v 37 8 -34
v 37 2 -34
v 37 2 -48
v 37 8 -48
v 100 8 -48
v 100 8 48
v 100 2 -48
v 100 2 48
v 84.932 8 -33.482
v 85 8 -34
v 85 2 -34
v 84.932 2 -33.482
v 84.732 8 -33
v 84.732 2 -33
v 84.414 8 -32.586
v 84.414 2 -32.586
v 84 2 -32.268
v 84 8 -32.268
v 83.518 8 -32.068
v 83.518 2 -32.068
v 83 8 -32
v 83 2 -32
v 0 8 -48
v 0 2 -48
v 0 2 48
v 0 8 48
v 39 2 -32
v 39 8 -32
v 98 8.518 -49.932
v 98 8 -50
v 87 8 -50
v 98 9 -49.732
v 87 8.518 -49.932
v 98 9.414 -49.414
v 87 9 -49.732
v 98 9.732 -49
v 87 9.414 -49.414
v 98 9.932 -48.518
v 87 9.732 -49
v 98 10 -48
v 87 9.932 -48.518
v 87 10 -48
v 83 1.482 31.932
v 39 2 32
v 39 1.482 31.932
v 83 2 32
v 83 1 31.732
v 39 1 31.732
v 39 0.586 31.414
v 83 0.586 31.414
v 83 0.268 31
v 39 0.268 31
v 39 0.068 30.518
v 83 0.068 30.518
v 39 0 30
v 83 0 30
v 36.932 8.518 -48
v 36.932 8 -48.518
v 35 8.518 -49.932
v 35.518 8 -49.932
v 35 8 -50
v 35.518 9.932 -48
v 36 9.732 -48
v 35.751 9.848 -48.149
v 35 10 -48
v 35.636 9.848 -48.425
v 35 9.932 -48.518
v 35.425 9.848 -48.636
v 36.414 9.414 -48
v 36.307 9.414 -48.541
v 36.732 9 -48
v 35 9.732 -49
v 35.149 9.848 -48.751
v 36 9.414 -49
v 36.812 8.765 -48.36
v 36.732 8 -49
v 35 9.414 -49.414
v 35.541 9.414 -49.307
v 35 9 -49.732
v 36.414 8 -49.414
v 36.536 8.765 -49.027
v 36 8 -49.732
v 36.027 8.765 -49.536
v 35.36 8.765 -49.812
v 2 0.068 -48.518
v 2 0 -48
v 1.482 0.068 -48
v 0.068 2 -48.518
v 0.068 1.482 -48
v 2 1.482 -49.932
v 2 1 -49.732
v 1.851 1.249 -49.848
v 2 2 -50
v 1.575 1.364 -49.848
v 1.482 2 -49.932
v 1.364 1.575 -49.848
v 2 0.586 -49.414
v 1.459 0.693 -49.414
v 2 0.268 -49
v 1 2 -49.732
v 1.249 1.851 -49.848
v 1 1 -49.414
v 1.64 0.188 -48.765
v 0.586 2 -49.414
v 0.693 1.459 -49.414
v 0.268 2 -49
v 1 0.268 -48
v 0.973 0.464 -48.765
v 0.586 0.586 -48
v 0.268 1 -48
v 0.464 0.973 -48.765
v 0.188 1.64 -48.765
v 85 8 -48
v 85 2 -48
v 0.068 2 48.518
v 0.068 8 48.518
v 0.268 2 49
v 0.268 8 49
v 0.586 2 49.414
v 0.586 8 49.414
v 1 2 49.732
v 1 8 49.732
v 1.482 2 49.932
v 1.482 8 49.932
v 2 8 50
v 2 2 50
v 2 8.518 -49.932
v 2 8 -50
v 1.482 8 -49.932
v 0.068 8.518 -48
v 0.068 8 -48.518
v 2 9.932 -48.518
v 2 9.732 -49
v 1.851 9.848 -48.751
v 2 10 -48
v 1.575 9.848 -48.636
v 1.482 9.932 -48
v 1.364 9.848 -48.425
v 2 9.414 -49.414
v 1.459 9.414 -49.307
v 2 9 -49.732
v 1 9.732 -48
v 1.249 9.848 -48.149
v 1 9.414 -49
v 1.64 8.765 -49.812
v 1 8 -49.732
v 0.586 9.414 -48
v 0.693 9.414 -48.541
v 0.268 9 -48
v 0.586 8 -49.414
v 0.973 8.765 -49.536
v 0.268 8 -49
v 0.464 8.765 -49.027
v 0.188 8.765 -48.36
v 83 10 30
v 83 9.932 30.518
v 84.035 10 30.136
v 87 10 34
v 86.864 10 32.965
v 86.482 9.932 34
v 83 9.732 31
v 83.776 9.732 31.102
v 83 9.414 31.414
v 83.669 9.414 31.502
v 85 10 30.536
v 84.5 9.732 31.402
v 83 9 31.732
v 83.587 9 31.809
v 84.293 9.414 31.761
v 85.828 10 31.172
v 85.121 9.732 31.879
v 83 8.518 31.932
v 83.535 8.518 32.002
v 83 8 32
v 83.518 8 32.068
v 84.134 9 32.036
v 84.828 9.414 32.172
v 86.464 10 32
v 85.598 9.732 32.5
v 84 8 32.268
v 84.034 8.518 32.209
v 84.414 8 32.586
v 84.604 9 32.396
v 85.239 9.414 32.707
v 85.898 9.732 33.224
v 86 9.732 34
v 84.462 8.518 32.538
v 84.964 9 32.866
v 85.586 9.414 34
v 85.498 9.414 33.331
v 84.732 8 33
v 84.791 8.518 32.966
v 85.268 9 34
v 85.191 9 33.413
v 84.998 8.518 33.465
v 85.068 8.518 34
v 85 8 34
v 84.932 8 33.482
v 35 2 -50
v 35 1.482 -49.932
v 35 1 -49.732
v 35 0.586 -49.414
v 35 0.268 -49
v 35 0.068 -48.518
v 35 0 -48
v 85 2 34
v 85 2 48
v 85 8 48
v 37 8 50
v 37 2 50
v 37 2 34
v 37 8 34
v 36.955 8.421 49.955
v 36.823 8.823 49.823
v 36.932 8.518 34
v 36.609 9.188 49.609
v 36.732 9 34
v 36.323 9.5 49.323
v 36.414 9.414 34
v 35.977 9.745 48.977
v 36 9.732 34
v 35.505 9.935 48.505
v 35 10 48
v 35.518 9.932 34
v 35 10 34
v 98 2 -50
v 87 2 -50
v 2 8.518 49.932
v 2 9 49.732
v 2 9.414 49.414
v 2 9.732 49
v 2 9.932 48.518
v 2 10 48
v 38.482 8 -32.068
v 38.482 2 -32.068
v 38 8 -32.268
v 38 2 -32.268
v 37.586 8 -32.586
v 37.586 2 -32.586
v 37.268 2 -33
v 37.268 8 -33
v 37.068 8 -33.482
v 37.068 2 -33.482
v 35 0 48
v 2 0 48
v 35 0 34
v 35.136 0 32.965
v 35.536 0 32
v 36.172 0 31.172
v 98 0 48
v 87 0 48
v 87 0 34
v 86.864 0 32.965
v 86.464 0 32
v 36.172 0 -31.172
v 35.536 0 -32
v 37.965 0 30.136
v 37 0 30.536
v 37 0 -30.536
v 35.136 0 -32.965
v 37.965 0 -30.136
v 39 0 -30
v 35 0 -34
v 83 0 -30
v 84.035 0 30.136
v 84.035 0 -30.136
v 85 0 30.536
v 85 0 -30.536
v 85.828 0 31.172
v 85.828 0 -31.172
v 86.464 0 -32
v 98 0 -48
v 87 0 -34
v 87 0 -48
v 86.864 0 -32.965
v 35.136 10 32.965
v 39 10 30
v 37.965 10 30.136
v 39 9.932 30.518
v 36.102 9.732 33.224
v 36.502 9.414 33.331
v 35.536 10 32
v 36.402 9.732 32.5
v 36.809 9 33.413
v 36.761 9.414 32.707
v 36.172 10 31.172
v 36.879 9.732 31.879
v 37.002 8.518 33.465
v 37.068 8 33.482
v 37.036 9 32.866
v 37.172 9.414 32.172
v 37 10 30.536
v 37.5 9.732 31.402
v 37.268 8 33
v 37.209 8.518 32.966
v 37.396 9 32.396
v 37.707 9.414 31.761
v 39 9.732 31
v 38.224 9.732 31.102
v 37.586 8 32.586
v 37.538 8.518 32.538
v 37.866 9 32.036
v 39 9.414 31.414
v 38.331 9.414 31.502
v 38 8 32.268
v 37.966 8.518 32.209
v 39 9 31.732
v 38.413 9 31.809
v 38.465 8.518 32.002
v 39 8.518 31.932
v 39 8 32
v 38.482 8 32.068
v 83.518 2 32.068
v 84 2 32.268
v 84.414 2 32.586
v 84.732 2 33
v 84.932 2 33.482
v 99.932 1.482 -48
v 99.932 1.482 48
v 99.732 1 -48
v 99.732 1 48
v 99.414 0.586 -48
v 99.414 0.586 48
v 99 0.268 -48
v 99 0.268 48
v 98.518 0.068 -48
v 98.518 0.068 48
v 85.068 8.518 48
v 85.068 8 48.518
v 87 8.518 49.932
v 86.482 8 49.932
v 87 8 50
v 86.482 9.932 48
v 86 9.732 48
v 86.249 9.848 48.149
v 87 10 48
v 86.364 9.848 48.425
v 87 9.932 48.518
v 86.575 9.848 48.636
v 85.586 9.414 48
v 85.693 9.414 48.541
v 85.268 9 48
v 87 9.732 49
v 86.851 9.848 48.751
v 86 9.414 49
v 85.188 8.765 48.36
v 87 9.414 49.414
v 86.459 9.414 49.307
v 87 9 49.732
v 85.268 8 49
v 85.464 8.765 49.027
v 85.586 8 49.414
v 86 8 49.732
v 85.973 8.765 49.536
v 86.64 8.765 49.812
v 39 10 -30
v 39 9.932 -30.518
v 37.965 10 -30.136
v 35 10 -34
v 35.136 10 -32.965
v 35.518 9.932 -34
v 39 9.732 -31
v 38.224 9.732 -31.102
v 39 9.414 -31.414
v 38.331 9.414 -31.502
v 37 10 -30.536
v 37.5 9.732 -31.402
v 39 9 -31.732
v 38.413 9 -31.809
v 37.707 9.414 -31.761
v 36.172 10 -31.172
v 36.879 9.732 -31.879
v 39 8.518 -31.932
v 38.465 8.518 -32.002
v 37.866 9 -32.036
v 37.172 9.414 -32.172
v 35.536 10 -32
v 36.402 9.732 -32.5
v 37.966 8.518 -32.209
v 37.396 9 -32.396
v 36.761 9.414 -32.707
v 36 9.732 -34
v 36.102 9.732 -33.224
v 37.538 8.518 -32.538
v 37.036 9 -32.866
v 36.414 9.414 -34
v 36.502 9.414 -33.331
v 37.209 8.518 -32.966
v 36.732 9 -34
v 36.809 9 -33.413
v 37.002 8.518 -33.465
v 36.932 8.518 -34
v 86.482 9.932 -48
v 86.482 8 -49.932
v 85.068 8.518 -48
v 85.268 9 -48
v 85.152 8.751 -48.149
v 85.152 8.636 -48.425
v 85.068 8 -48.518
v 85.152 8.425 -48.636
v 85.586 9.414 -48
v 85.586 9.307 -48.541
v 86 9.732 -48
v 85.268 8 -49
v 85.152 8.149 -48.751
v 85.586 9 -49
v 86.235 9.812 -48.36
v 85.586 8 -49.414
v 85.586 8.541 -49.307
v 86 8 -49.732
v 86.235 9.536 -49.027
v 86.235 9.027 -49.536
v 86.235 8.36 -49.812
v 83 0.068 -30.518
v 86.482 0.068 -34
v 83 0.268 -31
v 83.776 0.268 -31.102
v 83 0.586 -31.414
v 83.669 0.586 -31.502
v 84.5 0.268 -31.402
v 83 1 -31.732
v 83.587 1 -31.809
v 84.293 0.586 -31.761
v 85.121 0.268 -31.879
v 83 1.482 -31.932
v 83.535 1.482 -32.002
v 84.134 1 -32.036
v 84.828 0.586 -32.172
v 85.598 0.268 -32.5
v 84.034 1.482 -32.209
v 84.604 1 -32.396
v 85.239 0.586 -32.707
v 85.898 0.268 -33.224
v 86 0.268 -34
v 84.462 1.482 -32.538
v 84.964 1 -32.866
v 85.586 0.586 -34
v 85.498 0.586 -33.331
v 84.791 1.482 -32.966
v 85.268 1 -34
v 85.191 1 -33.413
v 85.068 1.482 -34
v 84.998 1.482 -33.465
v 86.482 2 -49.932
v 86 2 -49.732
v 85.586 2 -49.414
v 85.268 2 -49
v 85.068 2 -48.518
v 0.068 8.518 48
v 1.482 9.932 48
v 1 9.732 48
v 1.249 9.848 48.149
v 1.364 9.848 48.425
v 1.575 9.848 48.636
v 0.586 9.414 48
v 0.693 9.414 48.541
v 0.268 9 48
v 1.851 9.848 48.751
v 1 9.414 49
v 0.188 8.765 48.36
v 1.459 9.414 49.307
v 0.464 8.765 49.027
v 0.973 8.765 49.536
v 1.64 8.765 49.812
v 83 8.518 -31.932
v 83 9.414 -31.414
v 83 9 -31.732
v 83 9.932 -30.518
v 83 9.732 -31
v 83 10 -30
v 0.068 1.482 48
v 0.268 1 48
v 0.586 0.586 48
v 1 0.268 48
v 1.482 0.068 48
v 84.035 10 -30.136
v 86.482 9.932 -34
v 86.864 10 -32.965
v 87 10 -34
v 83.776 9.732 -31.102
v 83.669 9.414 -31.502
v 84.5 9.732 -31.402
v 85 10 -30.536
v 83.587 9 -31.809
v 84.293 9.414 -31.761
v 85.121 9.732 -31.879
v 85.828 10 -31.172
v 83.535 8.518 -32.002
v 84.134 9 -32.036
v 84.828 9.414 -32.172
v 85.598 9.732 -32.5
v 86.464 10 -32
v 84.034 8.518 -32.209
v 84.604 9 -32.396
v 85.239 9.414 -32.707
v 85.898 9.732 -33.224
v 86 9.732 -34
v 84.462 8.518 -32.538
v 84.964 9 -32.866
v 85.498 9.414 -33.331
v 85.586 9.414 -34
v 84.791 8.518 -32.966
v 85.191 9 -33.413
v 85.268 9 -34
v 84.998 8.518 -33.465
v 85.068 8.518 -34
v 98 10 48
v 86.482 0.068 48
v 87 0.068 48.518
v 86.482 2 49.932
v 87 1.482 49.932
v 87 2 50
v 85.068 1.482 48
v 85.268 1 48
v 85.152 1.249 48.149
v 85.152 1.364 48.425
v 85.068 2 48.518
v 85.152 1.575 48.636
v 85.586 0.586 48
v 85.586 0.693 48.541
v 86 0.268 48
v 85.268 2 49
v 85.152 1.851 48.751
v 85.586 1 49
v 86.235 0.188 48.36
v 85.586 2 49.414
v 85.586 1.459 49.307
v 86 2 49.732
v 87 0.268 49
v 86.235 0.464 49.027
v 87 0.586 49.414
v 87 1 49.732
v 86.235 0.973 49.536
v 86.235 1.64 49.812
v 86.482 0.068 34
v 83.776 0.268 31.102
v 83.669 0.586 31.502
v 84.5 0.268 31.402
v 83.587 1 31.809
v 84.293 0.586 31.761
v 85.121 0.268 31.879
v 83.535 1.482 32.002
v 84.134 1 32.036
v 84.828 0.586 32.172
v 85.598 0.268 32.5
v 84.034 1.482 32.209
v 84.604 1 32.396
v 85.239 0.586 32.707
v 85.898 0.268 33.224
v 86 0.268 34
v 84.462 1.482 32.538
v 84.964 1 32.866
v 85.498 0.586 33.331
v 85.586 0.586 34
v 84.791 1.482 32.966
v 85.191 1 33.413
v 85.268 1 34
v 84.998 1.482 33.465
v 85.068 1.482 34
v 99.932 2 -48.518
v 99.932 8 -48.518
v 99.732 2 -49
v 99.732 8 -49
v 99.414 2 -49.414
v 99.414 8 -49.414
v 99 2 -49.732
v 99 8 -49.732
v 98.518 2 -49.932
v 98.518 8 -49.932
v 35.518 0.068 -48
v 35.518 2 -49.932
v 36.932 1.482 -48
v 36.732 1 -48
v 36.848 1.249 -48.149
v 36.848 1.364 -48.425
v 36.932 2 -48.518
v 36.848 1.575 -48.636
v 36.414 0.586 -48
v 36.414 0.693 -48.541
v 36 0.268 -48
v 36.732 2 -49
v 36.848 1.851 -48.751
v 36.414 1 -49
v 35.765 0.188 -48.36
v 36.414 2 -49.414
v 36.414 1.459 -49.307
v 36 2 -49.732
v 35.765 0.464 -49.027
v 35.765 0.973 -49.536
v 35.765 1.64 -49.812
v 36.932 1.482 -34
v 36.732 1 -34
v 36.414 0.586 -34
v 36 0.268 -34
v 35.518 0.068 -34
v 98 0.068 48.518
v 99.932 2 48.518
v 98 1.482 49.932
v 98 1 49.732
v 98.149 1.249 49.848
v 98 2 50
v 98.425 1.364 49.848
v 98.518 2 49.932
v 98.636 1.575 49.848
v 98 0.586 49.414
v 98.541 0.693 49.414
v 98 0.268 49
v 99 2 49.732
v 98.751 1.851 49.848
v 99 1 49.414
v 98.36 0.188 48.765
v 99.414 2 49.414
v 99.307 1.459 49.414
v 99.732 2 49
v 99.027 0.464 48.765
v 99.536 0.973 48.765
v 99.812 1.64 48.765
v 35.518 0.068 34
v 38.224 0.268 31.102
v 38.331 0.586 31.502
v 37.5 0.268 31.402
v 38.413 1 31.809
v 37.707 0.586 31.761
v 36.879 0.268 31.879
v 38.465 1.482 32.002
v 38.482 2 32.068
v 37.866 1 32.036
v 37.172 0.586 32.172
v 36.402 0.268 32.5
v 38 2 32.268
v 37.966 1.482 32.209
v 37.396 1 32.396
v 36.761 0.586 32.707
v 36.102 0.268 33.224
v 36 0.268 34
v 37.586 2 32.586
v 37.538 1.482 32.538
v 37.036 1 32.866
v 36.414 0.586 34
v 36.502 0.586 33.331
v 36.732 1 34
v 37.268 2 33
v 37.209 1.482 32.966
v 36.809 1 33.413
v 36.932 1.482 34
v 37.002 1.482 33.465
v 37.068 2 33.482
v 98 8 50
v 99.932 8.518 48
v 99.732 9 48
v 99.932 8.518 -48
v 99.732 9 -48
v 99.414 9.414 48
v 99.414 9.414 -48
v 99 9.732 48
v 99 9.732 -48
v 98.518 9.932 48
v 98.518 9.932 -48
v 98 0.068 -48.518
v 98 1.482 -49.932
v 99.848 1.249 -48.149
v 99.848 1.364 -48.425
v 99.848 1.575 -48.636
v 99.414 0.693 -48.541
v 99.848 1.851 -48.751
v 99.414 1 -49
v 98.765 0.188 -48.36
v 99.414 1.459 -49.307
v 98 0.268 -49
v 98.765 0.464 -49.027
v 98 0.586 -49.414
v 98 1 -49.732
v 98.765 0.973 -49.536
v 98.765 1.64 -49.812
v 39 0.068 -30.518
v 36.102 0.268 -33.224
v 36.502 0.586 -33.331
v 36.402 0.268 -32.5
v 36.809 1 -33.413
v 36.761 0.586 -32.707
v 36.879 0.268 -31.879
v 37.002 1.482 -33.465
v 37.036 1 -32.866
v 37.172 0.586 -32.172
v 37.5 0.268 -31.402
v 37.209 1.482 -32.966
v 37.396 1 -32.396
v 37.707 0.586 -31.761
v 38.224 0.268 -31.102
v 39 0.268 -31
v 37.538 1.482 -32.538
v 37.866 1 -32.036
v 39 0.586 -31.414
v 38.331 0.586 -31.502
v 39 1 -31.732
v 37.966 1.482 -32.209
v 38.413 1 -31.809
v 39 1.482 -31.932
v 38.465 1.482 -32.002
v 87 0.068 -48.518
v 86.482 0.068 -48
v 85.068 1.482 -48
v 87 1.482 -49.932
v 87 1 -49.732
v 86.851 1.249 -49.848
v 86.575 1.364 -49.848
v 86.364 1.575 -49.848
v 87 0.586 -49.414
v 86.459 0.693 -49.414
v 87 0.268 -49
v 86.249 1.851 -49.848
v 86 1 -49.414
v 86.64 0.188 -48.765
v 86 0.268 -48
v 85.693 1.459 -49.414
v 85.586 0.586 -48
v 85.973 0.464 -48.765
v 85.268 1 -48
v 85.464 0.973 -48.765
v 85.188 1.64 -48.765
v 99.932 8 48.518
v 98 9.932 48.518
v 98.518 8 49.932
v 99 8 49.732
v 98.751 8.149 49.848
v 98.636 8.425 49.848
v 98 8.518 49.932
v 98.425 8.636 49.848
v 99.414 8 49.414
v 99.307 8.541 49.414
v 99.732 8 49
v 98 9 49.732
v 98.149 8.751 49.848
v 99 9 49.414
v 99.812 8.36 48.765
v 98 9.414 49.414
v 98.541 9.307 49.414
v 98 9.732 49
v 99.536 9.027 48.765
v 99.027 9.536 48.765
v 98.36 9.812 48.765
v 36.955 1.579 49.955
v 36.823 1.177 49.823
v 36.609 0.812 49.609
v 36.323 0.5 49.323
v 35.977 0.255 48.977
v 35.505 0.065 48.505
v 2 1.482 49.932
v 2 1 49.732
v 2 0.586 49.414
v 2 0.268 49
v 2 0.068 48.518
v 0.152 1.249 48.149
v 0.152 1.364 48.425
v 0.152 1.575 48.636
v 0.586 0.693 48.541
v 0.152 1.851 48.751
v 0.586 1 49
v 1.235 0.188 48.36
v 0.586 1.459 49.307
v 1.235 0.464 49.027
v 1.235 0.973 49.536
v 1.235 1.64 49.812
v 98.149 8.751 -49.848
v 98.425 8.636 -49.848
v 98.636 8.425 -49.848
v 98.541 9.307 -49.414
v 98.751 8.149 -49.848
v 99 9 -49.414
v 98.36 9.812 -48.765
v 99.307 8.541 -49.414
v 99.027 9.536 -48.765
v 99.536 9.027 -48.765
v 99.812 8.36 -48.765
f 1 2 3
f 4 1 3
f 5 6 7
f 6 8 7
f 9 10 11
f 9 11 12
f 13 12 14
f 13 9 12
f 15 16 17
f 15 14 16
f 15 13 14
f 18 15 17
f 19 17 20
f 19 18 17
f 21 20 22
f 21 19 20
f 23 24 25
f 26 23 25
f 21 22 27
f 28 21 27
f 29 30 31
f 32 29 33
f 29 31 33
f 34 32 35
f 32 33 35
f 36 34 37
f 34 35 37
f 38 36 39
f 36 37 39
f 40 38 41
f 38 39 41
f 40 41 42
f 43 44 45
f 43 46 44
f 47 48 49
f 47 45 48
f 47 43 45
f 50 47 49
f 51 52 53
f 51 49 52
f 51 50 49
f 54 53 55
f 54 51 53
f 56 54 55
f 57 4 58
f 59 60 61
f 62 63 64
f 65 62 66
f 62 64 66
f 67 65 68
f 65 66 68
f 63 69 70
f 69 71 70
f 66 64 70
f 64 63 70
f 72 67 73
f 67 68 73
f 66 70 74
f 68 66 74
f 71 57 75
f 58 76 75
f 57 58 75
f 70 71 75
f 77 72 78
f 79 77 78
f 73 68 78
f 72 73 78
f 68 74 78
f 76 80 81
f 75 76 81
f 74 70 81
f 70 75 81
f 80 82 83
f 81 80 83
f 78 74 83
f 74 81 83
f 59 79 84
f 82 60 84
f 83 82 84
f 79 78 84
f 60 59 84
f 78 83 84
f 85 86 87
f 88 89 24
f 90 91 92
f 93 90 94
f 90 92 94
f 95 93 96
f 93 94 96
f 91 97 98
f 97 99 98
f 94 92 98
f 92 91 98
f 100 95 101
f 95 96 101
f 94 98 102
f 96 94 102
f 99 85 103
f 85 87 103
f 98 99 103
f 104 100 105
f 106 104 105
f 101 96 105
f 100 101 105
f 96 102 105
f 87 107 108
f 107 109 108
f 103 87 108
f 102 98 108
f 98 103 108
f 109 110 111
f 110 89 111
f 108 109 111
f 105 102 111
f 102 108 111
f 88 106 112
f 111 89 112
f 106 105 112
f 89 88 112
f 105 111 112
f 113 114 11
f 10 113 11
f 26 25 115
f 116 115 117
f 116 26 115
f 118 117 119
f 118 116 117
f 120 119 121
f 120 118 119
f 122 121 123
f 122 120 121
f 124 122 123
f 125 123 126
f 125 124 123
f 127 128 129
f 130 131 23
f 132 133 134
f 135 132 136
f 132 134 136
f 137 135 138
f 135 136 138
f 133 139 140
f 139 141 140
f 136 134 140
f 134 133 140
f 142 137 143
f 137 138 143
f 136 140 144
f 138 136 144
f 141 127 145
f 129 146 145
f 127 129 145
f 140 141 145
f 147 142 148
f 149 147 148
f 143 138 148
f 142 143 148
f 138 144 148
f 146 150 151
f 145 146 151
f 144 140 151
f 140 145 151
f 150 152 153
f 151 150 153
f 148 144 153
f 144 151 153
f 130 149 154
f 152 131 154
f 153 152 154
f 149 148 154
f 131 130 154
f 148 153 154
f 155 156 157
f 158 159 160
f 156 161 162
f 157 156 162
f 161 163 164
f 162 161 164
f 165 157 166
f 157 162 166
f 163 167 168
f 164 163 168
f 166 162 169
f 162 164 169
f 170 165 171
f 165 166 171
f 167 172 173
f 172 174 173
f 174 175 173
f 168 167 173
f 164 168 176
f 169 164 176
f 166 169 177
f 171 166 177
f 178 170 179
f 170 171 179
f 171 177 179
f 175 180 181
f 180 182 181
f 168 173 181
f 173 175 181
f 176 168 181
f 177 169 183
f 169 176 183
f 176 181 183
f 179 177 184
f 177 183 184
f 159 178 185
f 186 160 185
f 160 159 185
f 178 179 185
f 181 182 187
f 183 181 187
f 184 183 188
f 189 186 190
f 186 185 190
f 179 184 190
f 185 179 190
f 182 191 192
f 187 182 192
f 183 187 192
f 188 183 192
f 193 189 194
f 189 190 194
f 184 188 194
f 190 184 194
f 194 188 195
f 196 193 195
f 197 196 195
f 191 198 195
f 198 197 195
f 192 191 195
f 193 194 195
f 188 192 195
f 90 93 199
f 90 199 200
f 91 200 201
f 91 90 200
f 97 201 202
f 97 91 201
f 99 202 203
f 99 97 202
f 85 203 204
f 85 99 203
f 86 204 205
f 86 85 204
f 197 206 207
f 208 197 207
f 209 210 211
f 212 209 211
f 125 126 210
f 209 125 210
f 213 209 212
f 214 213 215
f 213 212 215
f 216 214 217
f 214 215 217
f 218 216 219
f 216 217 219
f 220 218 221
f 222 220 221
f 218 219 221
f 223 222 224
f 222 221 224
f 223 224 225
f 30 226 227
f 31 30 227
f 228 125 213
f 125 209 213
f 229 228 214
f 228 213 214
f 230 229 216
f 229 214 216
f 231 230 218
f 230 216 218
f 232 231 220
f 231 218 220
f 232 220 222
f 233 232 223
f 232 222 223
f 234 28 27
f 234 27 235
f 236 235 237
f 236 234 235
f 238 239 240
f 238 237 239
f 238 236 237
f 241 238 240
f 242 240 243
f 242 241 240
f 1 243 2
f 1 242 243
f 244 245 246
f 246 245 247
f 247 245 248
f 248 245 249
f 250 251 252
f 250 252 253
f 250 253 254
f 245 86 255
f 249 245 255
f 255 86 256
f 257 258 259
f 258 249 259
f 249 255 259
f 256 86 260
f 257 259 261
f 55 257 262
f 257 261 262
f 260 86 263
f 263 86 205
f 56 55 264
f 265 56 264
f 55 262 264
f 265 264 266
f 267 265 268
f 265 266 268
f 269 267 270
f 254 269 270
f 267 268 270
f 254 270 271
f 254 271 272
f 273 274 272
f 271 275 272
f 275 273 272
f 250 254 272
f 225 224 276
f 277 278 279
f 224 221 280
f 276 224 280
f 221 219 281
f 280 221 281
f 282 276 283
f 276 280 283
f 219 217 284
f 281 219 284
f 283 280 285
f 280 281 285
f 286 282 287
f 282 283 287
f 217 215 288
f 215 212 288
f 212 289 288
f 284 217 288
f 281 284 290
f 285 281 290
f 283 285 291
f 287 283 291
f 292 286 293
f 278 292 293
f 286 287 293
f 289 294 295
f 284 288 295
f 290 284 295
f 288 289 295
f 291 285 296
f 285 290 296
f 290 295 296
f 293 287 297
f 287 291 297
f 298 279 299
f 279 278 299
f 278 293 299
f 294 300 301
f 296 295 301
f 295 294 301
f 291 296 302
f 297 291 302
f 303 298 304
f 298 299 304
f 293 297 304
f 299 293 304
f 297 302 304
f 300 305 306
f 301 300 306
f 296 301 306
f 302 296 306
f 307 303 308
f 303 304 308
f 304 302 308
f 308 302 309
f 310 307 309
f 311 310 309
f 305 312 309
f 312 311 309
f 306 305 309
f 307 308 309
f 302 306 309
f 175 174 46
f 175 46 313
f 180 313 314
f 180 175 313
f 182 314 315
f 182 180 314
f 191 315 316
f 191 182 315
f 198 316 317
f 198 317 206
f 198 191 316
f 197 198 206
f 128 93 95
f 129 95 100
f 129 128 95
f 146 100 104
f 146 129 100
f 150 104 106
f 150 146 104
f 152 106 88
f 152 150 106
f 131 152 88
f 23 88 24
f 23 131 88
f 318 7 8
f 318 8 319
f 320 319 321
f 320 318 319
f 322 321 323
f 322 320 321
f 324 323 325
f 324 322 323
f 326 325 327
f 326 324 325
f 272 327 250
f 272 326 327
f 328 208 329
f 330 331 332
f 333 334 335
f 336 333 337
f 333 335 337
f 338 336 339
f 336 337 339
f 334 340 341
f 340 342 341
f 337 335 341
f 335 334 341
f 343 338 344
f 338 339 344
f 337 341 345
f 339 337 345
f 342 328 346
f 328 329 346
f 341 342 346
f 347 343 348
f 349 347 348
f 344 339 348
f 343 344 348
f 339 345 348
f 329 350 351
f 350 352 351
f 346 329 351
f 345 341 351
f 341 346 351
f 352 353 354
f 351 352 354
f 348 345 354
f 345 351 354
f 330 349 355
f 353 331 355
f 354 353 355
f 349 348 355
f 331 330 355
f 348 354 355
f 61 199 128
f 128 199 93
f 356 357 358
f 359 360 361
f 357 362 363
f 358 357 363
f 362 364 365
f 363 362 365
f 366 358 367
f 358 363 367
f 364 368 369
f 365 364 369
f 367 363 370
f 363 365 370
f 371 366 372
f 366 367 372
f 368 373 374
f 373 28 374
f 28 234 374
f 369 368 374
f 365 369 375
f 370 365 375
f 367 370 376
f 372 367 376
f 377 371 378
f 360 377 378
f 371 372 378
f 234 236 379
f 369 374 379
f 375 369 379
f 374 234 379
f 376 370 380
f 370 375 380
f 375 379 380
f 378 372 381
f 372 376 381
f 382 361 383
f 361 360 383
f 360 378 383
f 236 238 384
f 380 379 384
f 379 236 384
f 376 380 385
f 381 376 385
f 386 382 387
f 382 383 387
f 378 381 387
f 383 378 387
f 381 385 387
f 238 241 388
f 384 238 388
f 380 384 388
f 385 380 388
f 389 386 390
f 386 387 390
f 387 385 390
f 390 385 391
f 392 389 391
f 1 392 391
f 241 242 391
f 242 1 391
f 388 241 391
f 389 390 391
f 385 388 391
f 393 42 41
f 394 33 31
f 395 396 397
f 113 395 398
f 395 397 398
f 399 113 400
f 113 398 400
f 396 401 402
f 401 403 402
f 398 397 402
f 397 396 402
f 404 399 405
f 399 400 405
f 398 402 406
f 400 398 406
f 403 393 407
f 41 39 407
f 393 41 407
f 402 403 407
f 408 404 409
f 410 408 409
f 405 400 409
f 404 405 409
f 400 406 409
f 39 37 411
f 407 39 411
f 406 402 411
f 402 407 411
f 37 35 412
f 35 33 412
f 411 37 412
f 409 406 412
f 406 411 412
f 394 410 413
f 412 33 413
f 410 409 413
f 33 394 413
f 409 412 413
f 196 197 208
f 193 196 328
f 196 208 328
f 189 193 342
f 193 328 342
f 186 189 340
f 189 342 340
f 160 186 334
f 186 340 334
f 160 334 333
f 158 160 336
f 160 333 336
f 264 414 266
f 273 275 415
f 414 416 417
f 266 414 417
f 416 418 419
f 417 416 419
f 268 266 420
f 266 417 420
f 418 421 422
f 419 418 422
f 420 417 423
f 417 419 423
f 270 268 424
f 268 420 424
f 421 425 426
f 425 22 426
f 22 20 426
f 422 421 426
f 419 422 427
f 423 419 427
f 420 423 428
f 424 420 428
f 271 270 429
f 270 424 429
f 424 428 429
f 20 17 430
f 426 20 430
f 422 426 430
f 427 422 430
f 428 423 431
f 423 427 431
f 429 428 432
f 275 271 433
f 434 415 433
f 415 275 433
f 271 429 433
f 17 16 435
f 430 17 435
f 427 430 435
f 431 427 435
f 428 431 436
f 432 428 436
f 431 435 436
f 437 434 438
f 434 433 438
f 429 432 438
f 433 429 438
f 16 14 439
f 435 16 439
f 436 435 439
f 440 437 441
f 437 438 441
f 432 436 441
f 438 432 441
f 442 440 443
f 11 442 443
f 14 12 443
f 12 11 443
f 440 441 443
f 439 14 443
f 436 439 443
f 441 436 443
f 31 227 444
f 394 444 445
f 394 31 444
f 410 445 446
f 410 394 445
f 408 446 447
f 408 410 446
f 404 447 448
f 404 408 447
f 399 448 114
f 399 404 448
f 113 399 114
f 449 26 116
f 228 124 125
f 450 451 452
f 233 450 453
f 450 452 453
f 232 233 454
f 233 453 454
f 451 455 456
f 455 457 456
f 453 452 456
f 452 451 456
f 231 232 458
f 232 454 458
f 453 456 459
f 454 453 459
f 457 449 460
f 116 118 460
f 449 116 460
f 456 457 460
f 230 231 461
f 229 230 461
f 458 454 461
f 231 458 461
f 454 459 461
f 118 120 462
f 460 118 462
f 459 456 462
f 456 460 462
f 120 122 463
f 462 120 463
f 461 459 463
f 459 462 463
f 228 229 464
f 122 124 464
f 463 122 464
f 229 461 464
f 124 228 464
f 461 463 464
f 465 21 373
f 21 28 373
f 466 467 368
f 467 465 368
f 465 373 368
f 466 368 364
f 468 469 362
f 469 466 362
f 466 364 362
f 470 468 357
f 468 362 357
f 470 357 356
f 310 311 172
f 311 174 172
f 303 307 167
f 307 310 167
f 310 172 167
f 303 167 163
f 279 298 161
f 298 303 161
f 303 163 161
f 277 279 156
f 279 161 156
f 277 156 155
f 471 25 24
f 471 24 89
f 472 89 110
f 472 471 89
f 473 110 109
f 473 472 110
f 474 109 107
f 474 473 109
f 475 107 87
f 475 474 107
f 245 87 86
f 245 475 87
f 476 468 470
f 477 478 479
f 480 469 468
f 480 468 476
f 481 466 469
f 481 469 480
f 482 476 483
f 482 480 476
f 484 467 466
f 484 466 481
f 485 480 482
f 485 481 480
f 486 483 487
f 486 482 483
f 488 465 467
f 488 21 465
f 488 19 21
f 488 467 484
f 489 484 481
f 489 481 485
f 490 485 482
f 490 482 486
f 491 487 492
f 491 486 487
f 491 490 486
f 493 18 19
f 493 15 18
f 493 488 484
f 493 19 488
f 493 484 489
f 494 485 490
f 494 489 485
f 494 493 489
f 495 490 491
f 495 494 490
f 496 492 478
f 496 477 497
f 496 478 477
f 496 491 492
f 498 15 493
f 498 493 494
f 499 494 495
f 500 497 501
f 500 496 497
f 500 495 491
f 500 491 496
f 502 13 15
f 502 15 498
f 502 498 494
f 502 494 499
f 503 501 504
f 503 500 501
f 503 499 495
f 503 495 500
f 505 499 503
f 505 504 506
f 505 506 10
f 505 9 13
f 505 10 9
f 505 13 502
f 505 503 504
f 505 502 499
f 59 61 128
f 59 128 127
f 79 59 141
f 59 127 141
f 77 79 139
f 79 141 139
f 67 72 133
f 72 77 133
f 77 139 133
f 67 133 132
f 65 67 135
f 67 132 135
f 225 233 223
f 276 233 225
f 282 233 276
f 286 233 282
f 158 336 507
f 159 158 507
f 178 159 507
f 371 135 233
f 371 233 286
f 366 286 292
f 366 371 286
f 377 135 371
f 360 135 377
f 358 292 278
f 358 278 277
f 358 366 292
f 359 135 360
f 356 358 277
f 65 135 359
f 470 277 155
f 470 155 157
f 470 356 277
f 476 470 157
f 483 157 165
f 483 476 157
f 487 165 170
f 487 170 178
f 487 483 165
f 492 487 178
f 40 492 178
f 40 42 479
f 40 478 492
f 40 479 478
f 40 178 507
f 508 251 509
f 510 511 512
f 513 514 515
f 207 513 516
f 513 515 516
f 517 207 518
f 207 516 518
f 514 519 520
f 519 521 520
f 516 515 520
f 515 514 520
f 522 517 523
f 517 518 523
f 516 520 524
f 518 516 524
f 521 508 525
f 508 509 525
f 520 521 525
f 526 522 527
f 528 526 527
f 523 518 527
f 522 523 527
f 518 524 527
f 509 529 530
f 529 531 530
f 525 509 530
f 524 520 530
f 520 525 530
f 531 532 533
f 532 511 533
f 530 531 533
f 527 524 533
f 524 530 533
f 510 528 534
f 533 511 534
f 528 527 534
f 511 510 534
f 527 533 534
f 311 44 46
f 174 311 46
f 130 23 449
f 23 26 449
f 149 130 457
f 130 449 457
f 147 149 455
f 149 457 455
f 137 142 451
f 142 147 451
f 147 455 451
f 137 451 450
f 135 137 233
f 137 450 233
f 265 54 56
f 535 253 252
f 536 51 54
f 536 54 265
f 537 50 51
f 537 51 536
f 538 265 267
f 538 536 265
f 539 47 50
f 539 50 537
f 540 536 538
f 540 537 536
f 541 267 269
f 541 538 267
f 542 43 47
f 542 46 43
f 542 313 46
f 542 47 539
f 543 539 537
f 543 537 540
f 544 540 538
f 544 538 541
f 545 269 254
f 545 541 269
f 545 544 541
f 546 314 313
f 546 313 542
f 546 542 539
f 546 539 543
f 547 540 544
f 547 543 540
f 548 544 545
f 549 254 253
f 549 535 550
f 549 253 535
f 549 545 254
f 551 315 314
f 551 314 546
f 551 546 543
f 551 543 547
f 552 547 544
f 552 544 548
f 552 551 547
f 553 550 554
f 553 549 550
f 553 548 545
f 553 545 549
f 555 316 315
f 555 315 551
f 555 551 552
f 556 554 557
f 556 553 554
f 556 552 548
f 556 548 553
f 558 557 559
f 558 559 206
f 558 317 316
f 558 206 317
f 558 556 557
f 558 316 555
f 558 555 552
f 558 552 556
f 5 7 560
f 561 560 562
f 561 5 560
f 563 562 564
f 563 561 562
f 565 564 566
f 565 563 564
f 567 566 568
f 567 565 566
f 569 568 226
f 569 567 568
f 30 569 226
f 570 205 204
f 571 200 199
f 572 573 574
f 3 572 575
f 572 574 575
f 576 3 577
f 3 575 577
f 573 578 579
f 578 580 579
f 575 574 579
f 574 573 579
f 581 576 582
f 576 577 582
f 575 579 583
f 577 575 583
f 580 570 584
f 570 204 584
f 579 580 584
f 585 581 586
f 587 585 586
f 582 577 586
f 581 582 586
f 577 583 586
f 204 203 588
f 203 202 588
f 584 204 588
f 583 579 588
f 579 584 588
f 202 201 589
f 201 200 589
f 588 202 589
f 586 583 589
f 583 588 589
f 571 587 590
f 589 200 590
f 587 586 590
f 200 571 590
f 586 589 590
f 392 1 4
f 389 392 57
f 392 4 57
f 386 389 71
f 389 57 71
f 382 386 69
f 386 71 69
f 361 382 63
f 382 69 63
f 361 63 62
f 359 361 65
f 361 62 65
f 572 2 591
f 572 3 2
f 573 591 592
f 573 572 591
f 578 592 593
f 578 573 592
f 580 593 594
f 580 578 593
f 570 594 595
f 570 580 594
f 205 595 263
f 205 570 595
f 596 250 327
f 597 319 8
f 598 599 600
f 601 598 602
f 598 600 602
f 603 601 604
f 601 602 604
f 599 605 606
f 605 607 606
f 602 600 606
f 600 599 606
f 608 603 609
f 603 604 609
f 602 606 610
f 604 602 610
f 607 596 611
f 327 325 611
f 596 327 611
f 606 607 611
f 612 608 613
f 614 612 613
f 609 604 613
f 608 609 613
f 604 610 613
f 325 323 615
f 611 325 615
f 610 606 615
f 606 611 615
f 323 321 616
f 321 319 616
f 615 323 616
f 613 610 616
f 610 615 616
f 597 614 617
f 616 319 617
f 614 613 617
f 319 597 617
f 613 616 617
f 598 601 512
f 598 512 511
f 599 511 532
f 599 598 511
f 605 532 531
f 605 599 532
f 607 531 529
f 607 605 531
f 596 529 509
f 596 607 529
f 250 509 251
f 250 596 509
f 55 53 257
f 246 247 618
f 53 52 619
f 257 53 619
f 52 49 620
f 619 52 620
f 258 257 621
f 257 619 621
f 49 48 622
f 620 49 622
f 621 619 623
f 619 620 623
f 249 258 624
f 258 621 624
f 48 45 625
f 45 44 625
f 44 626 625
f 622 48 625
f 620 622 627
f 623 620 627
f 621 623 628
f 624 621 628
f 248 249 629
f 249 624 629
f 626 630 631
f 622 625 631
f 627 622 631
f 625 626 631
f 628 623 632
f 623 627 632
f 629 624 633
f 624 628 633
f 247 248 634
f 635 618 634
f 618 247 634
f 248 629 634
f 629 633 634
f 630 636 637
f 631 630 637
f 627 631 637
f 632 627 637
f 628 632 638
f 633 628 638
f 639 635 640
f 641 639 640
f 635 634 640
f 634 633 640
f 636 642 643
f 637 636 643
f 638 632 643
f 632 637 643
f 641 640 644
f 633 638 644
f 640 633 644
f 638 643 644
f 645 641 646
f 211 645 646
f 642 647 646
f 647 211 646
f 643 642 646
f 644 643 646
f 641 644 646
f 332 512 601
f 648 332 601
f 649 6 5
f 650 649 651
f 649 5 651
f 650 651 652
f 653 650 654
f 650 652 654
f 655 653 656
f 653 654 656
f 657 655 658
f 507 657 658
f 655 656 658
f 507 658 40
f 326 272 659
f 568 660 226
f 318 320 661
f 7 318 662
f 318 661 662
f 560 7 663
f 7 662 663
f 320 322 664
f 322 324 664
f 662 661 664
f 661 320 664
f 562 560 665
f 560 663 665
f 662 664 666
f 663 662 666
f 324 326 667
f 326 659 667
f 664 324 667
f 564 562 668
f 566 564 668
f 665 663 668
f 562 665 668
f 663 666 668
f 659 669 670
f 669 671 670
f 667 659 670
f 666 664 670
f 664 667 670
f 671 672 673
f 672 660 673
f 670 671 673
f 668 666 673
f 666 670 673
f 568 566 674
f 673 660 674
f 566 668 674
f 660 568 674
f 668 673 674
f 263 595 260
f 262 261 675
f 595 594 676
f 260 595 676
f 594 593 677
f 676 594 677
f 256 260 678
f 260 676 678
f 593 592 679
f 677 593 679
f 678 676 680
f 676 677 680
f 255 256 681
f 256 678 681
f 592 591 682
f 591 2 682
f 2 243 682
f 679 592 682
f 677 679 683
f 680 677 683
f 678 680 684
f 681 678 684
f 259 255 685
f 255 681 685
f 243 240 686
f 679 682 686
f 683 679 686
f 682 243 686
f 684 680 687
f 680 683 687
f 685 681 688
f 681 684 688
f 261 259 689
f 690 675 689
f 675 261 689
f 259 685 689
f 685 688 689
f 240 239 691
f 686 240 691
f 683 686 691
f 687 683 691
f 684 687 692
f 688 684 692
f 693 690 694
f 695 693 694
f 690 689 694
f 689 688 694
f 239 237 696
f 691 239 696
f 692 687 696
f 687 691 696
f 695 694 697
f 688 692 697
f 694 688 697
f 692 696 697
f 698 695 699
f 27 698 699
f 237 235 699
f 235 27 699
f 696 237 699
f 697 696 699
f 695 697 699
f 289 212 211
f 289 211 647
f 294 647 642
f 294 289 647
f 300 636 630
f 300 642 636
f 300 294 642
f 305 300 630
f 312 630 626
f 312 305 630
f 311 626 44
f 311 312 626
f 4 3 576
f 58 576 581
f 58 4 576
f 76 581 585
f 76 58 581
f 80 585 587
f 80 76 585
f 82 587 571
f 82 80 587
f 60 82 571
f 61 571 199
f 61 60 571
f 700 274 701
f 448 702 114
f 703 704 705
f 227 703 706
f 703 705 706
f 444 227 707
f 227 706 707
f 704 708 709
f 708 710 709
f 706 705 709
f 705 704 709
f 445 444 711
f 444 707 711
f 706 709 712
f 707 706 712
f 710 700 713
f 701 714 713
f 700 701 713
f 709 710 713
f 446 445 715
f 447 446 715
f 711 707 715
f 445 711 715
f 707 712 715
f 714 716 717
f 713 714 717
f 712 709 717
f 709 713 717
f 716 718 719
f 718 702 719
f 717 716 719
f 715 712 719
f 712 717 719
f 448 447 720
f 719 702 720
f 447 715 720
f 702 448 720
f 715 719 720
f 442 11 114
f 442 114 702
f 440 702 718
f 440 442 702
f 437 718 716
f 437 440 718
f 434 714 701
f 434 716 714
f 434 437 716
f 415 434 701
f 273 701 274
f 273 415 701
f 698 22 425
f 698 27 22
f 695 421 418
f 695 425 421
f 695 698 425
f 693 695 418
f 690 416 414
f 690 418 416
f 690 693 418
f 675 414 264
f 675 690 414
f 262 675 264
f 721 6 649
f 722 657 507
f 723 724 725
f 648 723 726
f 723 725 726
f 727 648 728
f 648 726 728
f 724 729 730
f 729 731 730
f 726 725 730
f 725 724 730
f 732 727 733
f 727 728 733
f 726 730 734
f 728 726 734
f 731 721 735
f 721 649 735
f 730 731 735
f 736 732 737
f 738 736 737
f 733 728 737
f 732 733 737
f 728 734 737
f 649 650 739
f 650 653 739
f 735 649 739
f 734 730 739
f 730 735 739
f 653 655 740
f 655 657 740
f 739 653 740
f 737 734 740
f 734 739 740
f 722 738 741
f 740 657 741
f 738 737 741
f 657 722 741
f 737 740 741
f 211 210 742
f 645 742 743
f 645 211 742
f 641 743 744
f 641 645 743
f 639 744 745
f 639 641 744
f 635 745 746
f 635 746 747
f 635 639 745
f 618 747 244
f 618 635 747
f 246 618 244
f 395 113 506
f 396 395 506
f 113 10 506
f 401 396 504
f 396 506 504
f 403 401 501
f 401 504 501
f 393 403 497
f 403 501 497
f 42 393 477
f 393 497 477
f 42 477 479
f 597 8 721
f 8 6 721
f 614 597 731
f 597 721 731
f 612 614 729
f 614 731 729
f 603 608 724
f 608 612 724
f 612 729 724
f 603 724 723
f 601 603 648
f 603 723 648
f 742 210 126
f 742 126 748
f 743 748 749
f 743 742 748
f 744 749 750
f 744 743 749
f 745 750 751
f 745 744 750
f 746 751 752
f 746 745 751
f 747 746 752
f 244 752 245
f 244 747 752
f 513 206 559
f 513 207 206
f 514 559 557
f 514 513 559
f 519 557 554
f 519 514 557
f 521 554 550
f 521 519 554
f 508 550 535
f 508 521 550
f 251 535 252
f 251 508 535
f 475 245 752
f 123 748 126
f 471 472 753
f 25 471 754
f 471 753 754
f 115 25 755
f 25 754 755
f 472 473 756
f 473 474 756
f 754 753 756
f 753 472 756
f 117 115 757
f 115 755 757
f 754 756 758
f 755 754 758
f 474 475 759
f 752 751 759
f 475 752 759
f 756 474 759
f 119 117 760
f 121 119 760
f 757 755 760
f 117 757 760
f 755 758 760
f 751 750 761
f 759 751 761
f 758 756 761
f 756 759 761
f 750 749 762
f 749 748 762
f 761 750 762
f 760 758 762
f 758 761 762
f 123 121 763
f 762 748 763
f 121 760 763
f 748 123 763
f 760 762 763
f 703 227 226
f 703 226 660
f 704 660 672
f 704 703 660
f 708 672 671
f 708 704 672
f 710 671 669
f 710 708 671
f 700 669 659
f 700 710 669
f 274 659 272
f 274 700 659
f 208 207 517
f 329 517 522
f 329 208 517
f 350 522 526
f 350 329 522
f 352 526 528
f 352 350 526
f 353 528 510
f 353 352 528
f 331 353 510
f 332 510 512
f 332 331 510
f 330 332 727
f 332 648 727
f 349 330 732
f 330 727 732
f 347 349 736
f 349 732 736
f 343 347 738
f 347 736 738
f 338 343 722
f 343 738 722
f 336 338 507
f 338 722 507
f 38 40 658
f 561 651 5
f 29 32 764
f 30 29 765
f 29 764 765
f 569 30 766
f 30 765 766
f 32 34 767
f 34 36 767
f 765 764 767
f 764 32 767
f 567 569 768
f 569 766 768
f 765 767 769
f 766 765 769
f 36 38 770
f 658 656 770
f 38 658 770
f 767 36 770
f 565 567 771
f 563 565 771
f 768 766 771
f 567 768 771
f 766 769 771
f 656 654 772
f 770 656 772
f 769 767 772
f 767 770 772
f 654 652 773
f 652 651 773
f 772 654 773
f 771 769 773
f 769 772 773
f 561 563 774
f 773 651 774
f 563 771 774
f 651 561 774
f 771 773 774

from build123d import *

# Parameters (mm, degrees)
BOSS_EXTRUDE1_DEPTH = 10
FILLET1_R           = 2


with BuildPart() as part:
    # Sketch1 → Boss-Extrude1 (new body)
    with BuildSketch(Plane(origin=(0, 0, 0), x_dir=(1, 0, 0), z_dir=(0, 1, 0))):
        Polygon((100, -50), (100, 50), (85, 50), (85, 32), (37, 32), (37, 50), (0, 50), (0, -50), (37, -50), (37, -32), (85, -32), (85, -50), align=None)
    extrude(amount=BOSS_EXTRUDE1_DEPTH)

    # Fillet1
    fillet1_edges = [part.edges().sort_by_distance(p)[0] for p in [
        (61, 0, 32),
        (37, 0, 41),
        (100, 10, 0),
        (18.5, 0, 50),
        (0, 0, 0),
        (18.5, 0, -50),
        (37, 0, -41),
        (61, 0, -32),
        (85, 0, -41),
        (92.5, 0, -50),
        (100, 0, 0),
        (92.5, 0, 50),
        (85, 0, 41),
        (92.5, 10, -50),
        (85, 5, 32),
        (37, 5, 32),
        (85, 10, -41),
        (0, 5, 50),
        (0, 5, -50),
        (37, 5, -50),
        (37, 5, -32),
        (85, 5, -32),
        (85, 5, -50),
        (100, 5, -50),
        (100, 5, 50),
        (85, 5, 50),
        (61, 10, -32),
        (37, 10, -41),
        (18.5, 10, -50),
        (0, 10, 0),
        (18.5, 10, 50),
        (37, 10, 41),
        (61, 10, 32),
        (85, 10, 41),
        (92.5, 10, 50),
    ]]
    fillet(fillet1_edges, radius=FILLET1_R)


solid = part.part
